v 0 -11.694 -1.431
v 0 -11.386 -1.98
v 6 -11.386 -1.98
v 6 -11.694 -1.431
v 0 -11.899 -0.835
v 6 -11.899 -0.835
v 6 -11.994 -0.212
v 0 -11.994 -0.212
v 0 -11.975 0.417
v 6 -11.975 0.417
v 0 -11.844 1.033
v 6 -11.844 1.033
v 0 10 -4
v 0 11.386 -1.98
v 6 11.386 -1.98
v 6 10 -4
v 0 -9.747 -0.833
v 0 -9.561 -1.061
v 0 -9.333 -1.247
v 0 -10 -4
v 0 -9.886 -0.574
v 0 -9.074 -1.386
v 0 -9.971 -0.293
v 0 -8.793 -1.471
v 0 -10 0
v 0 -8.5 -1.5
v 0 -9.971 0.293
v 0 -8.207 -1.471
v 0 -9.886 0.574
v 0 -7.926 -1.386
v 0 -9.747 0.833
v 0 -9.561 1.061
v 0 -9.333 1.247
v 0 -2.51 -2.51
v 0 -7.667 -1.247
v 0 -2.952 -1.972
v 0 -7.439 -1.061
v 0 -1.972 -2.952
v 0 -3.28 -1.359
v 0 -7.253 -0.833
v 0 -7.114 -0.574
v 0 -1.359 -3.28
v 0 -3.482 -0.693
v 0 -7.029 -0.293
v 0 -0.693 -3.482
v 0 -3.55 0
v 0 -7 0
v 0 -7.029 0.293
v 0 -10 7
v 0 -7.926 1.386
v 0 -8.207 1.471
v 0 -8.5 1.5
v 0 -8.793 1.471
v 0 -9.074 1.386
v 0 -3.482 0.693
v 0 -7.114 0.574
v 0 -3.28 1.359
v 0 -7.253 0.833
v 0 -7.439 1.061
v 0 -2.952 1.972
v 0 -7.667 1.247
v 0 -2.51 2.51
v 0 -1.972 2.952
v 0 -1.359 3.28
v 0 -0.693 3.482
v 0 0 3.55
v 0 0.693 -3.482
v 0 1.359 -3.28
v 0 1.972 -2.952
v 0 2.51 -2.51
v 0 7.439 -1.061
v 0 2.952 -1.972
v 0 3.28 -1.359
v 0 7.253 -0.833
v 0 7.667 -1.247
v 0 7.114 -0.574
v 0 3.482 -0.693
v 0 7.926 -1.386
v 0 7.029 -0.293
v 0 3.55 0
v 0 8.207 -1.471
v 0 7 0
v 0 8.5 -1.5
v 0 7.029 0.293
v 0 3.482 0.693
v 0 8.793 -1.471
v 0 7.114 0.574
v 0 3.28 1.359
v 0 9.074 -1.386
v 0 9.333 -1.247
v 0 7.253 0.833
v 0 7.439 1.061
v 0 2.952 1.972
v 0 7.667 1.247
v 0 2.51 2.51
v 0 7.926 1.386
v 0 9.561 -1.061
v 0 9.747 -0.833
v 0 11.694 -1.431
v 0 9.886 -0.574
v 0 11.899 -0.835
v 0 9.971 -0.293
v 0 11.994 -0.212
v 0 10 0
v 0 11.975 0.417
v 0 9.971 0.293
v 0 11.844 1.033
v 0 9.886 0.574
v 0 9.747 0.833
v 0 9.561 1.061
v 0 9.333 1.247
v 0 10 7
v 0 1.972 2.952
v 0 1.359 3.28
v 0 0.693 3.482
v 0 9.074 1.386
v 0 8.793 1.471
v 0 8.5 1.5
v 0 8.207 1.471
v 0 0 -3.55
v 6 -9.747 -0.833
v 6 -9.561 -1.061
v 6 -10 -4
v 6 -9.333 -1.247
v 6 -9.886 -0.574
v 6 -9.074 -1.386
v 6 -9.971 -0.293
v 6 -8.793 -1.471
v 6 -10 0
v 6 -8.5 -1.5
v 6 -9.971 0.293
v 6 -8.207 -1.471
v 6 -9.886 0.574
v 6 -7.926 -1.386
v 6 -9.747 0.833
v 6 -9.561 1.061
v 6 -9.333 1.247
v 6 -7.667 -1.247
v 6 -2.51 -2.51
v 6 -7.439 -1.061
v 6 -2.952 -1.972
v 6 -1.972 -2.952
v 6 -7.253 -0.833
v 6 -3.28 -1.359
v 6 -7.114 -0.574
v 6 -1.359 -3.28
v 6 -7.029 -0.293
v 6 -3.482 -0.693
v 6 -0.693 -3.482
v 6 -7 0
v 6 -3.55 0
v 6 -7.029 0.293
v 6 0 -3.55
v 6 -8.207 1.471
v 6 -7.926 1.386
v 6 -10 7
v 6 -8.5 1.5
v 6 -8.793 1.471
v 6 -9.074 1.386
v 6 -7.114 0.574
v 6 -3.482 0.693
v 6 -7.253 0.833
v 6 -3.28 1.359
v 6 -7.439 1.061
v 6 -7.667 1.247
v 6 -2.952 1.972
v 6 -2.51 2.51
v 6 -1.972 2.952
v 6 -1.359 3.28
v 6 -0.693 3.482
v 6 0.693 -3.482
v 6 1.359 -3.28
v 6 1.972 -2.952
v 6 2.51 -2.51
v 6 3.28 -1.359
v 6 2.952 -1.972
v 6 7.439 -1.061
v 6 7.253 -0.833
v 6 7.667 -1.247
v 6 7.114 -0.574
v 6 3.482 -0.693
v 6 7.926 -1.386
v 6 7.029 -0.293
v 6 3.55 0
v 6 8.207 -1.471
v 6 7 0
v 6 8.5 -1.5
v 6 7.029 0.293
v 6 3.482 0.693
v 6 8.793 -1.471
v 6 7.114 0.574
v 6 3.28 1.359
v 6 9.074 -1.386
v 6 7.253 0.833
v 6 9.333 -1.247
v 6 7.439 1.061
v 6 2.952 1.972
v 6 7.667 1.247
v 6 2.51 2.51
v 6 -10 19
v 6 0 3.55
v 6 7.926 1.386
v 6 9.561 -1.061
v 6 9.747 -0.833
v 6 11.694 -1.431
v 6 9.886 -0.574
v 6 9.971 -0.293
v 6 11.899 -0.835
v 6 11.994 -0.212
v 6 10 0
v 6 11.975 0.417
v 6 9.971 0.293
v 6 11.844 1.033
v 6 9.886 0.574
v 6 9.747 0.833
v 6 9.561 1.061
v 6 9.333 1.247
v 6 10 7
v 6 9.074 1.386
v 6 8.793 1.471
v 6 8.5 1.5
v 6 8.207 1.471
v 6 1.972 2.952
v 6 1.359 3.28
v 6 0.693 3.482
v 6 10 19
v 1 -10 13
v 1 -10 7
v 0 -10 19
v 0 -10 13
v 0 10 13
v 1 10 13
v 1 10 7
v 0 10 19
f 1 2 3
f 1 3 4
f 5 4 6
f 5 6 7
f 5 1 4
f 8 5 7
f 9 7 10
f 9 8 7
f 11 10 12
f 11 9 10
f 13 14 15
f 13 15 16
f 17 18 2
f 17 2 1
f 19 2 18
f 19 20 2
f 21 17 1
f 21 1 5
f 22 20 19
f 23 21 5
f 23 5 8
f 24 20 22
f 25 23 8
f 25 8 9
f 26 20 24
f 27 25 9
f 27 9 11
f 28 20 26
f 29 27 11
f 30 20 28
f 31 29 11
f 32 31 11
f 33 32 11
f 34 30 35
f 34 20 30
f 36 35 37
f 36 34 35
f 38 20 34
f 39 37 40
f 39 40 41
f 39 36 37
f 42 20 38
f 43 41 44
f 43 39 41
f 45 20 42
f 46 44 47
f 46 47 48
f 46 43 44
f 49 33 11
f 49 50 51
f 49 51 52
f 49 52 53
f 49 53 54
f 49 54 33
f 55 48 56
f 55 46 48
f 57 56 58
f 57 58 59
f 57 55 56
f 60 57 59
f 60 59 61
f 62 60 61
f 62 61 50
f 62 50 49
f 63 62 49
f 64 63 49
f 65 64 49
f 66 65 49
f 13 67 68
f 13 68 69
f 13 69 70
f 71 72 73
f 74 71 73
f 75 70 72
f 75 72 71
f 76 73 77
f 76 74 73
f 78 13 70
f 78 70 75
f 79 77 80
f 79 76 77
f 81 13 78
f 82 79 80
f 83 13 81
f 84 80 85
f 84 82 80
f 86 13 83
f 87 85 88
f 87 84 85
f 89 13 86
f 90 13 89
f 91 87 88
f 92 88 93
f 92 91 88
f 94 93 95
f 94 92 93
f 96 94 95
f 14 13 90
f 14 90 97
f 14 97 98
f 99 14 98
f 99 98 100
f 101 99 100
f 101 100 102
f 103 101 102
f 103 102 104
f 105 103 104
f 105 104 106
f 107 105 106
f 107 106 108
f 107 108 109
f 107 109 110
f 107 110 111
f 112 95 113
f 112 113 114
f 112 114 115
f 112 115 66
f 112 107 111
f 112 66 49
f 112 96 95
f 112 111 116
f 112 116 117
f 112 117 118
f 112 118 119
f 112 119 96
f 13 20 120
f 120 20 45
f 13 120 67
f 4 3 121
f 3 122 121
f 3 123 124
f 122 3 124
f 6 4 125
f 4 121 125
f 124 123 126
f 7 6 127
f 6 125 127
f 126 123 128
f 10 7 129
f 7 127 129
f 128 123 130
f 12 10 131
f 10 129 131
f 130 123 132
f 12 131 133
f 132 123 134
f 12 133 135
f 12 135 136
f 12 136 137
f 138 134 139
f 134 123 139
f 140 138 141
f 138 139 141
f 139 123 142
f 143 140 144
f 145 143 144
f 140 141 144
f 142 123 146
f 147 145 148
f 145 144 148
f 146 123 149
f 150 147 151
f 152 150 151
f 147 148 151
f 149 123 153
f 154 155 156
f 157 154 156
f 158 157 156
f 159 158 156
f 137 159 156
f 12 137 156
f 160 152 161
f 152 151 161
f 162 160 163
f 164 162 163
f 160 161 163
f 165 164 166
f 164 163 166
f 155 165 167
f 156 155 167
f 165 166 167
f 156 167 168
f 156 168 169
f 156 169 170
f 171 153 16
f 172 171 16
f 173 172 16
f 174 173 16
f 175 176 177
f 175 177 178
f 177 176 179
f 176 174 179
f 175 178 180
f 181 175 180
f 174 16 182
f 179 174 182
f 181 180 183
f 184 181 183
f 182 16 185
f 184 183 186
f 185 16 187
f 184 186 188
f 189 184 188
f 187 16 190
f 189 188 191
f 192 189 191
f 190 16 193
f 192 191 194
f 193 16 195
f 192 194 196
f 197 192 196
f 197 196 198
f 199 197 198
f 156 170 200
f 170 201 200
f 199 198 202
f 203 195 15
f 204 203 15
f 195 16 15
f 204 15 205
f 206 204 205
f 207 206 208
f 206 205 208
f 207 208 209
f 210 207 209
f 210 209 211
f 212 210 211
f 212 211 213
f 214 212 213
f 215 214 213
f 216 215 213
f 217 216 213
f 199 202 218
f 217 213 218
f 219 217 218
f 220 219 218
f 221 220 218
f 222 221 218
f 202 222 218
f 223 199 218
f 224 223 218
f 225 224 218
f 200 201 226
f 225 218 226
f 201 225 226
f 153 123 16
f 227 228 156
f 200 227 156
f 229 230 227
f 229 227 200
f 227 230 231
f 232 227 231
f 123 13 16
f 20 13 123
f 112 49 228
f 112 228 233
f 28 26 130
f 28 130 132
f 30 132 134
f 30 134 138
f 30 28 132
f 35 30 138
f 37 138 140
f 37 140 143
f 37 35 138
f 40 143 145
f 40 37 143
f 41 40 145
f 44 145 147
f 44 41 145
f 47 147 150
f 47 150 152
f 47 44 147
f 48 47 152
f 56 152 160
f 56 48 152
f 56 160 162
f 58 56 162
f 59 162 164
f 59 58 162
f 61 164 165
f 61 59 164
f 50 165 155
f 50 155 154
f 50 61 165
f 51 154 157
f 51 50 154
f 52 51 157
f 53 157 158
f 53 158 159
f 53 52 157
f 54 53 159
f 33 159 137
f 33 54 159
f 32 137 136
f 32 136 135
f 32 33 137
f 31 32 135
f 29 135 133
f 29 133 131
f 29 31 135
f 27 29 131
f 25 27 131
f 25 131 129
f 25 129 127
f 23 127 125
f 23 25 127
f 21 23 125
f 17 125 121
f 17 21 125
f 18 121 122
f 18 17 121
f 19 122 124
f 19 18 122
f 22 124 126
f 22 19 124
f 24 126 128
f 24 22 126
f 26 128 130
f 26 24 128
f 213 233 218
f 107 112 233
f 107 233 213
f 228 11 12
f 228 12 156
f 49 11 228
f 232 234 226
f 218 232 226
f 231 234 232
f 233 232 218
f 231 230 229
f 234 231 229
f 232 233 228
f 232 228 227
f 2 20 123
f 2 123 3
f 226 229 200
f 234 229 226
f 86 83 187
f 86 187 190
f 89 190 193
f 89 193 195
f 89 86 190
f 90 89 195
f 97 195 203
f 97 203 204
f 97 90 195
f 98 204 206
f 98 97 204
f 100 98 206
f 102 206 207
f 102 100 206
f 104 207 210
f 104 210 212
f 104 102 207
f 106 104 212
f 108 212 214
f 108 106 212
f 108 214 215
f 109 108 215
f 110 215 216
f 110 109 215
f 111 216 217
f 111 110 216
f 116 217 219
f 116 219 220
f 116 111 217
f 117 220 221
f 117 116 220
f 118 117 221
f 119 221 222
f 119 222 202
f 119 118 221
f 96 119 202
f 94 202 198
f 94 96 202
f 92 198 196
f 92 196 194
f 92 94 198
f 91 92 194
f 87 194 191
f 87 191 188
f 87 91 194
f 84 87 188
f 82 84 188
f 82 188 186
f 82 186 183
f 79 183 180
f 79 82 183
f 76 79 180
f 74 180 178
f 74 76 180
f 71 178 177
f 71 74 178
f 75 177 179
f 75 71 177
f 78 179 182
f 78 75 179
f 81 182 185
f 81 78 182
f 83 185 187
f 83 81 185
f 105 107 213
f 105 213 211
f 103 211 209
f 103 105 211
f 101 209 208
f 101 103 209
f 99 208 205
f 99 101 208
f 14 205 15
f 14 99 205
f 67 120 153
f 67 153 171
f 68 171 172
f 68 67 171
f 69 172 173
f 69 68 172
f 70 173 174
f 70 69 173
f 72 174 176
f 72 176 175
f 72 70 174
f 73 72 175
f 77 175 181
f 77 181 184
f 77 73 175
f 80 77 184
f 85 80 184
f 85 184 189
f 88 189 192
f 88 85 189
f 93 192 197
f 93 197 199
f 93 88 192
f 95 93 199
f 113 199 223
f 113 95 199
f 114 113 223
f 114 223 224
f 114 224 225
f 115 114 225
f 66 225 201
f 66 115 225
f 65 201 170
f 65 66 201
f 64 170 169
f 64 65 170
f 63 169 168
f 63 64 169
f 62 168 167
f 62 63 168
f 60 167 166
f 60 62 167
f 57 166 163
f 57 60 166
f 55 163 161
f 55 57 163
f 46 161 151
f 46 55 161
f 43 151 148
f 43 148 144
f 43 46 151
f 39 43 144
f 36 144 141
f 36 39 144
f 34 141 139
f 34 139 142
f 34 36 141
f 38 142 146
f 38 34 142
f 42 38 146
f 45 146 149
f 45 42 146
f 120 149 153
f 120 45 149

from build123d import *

# Parameters (mm, degrees)
SKETCH1_R           = 3.55
SKETCH1_R_2         = 1.5
BOSS_EXTRUDE1_DEPTH = 6
SKETCH2_W           = 6
SKETCH2_H           = 20
CUT_EXTRUDE1_DEPTH  = 1


with BuildPart() as part:
    # Sketch1 → Boss-Extrude1 (new body)
    with BuildSketch(Plane(origin=(0, 0, 0), x_dir=(0, 0, -1), z_dir=(1, 0, 0))):
        with BuildLine():
            Line((-7, 10), (-1.033439229, 11.843950263))
            ThreePointArc((-1.033439229, 11.843950263), (0.525907674, 11.960263157), (1.980283773, 11.38590994))
            Line((1.980283773, 11.38590994), (4, 10))
            Line((4, 10), (4, -10))
            Line((4, -10), (1.980283773, -11.38590994))
            ThreePointArc((1.980283773, -11.38590994), (0.525907674, -11.960263157), (-1.033439229, -11.843950263))
            Line((-1.033439229, -11.843950263), (-7, -10))
            Line((-7, -10), (-19, -10))
            Line((-19, -10), (-19, 10))
            Line((-19, 10), (-7, 10))
        make_face()
        Circle(SKETCH1_R, mode=Mode.SUBTRACT)
        with Locations((0, -8.5)):
            Circle(SKETCH1_R_2, mode=Mode.SUBTRACT)
        with Locations((0, 8.5)):
            Circle(SKETCH1_R_2, mode=Mode.SUBTRACT)
    extrude(amount=BOSS_EXTRUDE1_DEPTH)

    # Sketch2 → Cut-Extrude1 (cut)
    with BuildSketch(Plane.ZY):
        with Locations((10, 0)):
            Rectangle(SKETCH2_W, SKETCH2_H)
    extrude(amount=-CUT_EXTRUDE1_DEPTH, mode=Mode.SUBTRACT)


solid = part.part
